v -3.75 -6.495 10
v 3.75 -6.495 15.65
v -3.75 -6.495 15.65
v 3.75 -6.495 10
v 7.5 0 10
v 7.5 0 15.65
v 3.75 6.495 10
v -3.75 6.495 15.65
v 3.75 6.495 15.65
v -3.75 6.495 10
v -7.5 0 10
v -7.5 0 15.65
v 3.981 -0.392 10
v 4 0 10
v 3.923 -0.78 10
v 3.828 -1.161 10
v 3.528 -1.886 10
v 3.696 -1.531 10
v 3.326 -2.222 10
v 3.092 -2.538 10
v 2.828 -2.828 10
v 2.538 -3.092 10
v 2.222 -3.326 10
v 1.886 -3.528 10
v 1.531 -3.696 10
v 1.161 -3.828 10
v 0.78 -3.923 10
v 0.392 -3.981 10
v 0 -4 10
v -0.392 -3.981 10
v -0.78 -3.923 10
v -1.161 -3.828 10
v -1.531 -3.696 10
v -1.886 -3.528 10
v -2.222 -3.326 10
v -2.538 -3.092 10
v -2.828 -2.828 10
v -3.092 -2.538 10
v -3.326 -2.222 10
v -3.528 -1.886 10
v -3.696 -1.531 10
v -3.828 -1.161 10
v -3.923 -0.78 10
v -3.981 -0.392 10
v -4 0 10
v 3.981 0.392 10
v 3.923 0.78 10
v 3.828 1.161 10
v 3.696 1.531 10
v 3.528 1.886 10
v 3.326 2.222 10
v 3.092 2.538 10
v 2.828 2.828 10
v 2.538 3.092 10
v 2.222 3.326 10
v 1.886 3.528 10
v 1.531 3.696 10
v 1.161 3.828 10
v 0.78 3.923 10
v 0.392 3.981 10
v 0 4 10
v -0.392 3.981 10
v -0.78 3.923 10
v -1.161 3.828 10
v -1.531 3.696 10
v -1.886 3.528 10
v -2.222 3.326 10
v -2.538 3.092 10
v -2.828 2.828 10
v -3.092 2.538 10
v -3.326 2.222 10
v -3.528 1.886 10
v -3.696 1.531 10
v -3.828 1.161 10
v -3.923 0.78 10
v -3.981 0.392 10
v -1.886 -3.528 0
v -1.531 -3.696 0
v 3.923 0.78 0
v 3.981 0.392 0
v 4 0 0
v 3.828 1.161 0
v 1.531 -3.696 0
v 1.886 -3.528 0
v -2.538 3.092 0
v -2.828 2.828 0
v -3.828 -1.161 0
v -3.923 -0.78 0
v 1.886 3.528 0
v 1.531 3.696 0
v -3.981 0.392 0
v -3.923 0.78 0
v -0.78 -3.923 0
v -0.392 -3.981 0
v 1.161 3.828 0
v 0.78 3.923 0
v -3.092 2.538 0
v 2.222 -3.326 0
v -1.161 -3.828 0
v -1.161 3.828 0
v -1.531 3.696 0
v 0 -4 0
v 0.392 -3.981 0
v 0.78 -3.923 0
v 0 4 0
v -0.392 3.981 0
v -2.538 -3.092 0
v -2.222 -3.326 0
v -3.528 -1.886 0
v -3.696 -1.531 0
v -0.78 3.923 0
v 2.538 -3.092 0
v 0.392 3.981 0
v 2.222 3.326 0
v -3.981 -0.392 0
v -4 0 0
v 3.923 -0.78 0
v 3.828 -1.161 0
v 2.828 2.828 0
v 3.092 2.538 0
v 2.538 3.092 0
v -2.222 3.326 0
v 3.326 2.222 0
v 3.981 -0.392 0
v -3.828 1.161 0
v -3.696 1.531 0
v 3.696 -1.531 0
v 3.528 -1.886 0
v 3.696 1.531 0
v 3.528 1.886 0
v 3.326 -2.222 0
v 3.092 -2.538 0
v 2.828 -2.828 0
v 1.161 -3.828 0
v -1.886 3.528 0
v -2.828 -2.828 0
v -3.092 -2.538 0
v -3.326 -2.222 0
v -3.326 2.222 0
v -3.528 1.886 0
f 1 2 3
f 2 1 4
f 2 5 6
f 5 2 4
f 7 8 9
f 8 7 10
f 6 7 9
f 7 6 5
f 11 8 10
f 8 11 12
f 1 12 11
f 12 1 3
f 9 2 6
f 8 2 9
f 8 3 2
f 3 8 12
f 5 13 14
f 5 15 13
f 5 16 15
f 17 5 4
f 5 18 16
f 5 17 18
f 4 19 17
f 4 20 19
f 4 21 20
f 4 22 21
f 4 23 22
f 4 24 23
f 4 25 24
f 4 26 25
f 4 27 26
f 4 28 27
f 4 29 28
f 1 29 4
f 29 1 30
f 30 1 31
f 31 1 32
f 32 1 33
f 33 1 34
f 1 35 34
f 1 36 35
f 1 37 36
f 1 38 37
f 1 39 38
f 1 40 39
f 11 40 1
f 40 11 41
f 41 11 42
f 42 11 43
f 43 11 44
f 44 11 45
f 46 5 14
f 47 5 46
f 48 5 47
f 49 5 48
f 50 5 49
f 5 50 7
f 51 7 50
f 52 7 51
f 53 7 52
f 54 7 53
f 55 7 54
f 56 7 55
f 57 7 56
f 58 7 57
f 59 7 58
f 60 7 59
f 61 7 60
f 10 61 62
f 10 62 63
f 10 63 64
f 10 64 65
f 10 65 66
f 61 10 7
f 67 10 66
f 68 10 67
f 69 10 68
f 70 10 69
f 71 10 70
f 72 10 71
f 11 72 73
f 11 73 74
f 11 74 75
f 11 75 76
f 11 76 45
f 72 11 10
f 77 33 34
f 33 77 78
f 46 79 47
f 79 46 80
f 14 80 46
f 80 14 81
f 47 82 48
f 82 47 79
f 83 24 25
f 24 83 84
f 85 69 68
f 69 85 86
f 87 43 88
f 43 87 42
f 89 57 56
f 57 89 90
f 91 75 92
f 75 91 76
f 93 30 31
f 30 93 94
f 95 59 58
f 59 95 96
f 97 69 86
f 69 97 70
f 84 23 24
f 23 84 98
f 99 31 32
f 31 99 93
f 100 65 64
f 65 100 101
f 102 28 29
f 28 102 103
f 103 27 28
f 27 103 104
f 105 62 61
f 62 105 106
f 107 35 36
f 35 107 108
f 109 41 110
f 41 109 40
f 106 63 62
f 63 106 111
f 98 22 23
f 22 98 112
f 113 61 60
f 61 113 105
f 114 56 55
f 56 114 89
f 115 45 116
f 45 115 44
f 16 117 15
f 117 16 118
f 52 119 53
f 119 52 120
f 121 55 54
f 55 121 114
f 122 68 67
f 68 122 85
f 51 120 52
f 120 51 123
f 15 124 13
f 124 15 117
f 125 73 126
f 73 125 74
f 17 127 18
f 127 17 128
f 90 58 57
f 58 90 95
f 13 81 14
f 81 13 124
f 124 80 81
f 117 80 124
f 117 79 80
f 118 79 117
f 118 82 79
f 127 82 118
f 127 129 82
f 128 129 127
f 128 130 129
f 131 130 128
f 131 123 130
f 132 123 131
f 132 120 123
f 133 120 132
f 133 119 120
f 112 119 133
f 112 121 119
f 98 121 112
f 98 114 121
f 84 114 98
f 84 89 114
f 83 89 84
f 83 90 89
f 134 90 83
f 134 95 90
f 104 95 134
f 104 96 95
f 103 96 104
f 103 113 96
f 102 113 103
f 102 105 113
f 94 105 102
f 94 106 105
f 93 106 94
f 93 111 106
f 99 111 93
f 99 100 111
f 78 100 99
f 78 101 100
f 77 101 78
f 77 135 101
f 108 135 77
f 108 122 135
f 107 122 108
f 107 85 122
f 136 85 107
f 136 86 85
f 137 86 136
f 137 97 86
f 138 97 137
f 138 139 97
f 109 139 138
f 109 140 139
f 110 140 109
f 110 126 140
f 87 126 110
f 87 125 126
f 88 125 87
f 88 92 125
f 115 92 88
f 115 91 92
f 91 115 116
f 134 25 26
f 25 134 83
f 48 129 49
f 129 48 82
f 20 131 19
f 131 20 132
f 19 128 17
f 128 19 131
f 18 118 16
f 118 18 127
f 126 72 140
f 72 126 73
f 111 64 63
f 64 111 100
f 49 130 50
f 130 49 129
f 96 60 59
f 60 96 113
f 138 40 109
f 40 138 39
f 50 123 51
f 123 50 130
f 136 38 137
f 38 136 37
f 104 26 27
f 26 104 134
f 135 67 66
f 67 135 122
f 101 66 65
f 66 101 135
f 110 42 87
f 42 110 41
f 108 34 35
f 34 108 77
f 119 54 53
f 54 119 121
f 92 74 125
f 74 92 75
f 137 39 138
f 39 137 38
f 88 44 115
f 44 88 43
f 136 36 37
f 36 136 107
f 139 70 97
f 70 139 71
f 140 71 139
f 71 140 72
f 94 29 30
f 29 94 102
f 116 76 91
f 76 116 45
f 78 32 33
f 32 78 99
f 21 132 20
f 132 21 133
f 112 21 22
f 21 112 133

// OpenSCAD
module hex_head_screw() {
    union() {
        // Screw head
        translate([0, 0, 10])
            cylinder(h=5.65, d=15.0, $fn=6);
        
        // Screw body
        cylinder(h=10, d=8.0, $fn=64);
    }
}

hex_head_screw();
